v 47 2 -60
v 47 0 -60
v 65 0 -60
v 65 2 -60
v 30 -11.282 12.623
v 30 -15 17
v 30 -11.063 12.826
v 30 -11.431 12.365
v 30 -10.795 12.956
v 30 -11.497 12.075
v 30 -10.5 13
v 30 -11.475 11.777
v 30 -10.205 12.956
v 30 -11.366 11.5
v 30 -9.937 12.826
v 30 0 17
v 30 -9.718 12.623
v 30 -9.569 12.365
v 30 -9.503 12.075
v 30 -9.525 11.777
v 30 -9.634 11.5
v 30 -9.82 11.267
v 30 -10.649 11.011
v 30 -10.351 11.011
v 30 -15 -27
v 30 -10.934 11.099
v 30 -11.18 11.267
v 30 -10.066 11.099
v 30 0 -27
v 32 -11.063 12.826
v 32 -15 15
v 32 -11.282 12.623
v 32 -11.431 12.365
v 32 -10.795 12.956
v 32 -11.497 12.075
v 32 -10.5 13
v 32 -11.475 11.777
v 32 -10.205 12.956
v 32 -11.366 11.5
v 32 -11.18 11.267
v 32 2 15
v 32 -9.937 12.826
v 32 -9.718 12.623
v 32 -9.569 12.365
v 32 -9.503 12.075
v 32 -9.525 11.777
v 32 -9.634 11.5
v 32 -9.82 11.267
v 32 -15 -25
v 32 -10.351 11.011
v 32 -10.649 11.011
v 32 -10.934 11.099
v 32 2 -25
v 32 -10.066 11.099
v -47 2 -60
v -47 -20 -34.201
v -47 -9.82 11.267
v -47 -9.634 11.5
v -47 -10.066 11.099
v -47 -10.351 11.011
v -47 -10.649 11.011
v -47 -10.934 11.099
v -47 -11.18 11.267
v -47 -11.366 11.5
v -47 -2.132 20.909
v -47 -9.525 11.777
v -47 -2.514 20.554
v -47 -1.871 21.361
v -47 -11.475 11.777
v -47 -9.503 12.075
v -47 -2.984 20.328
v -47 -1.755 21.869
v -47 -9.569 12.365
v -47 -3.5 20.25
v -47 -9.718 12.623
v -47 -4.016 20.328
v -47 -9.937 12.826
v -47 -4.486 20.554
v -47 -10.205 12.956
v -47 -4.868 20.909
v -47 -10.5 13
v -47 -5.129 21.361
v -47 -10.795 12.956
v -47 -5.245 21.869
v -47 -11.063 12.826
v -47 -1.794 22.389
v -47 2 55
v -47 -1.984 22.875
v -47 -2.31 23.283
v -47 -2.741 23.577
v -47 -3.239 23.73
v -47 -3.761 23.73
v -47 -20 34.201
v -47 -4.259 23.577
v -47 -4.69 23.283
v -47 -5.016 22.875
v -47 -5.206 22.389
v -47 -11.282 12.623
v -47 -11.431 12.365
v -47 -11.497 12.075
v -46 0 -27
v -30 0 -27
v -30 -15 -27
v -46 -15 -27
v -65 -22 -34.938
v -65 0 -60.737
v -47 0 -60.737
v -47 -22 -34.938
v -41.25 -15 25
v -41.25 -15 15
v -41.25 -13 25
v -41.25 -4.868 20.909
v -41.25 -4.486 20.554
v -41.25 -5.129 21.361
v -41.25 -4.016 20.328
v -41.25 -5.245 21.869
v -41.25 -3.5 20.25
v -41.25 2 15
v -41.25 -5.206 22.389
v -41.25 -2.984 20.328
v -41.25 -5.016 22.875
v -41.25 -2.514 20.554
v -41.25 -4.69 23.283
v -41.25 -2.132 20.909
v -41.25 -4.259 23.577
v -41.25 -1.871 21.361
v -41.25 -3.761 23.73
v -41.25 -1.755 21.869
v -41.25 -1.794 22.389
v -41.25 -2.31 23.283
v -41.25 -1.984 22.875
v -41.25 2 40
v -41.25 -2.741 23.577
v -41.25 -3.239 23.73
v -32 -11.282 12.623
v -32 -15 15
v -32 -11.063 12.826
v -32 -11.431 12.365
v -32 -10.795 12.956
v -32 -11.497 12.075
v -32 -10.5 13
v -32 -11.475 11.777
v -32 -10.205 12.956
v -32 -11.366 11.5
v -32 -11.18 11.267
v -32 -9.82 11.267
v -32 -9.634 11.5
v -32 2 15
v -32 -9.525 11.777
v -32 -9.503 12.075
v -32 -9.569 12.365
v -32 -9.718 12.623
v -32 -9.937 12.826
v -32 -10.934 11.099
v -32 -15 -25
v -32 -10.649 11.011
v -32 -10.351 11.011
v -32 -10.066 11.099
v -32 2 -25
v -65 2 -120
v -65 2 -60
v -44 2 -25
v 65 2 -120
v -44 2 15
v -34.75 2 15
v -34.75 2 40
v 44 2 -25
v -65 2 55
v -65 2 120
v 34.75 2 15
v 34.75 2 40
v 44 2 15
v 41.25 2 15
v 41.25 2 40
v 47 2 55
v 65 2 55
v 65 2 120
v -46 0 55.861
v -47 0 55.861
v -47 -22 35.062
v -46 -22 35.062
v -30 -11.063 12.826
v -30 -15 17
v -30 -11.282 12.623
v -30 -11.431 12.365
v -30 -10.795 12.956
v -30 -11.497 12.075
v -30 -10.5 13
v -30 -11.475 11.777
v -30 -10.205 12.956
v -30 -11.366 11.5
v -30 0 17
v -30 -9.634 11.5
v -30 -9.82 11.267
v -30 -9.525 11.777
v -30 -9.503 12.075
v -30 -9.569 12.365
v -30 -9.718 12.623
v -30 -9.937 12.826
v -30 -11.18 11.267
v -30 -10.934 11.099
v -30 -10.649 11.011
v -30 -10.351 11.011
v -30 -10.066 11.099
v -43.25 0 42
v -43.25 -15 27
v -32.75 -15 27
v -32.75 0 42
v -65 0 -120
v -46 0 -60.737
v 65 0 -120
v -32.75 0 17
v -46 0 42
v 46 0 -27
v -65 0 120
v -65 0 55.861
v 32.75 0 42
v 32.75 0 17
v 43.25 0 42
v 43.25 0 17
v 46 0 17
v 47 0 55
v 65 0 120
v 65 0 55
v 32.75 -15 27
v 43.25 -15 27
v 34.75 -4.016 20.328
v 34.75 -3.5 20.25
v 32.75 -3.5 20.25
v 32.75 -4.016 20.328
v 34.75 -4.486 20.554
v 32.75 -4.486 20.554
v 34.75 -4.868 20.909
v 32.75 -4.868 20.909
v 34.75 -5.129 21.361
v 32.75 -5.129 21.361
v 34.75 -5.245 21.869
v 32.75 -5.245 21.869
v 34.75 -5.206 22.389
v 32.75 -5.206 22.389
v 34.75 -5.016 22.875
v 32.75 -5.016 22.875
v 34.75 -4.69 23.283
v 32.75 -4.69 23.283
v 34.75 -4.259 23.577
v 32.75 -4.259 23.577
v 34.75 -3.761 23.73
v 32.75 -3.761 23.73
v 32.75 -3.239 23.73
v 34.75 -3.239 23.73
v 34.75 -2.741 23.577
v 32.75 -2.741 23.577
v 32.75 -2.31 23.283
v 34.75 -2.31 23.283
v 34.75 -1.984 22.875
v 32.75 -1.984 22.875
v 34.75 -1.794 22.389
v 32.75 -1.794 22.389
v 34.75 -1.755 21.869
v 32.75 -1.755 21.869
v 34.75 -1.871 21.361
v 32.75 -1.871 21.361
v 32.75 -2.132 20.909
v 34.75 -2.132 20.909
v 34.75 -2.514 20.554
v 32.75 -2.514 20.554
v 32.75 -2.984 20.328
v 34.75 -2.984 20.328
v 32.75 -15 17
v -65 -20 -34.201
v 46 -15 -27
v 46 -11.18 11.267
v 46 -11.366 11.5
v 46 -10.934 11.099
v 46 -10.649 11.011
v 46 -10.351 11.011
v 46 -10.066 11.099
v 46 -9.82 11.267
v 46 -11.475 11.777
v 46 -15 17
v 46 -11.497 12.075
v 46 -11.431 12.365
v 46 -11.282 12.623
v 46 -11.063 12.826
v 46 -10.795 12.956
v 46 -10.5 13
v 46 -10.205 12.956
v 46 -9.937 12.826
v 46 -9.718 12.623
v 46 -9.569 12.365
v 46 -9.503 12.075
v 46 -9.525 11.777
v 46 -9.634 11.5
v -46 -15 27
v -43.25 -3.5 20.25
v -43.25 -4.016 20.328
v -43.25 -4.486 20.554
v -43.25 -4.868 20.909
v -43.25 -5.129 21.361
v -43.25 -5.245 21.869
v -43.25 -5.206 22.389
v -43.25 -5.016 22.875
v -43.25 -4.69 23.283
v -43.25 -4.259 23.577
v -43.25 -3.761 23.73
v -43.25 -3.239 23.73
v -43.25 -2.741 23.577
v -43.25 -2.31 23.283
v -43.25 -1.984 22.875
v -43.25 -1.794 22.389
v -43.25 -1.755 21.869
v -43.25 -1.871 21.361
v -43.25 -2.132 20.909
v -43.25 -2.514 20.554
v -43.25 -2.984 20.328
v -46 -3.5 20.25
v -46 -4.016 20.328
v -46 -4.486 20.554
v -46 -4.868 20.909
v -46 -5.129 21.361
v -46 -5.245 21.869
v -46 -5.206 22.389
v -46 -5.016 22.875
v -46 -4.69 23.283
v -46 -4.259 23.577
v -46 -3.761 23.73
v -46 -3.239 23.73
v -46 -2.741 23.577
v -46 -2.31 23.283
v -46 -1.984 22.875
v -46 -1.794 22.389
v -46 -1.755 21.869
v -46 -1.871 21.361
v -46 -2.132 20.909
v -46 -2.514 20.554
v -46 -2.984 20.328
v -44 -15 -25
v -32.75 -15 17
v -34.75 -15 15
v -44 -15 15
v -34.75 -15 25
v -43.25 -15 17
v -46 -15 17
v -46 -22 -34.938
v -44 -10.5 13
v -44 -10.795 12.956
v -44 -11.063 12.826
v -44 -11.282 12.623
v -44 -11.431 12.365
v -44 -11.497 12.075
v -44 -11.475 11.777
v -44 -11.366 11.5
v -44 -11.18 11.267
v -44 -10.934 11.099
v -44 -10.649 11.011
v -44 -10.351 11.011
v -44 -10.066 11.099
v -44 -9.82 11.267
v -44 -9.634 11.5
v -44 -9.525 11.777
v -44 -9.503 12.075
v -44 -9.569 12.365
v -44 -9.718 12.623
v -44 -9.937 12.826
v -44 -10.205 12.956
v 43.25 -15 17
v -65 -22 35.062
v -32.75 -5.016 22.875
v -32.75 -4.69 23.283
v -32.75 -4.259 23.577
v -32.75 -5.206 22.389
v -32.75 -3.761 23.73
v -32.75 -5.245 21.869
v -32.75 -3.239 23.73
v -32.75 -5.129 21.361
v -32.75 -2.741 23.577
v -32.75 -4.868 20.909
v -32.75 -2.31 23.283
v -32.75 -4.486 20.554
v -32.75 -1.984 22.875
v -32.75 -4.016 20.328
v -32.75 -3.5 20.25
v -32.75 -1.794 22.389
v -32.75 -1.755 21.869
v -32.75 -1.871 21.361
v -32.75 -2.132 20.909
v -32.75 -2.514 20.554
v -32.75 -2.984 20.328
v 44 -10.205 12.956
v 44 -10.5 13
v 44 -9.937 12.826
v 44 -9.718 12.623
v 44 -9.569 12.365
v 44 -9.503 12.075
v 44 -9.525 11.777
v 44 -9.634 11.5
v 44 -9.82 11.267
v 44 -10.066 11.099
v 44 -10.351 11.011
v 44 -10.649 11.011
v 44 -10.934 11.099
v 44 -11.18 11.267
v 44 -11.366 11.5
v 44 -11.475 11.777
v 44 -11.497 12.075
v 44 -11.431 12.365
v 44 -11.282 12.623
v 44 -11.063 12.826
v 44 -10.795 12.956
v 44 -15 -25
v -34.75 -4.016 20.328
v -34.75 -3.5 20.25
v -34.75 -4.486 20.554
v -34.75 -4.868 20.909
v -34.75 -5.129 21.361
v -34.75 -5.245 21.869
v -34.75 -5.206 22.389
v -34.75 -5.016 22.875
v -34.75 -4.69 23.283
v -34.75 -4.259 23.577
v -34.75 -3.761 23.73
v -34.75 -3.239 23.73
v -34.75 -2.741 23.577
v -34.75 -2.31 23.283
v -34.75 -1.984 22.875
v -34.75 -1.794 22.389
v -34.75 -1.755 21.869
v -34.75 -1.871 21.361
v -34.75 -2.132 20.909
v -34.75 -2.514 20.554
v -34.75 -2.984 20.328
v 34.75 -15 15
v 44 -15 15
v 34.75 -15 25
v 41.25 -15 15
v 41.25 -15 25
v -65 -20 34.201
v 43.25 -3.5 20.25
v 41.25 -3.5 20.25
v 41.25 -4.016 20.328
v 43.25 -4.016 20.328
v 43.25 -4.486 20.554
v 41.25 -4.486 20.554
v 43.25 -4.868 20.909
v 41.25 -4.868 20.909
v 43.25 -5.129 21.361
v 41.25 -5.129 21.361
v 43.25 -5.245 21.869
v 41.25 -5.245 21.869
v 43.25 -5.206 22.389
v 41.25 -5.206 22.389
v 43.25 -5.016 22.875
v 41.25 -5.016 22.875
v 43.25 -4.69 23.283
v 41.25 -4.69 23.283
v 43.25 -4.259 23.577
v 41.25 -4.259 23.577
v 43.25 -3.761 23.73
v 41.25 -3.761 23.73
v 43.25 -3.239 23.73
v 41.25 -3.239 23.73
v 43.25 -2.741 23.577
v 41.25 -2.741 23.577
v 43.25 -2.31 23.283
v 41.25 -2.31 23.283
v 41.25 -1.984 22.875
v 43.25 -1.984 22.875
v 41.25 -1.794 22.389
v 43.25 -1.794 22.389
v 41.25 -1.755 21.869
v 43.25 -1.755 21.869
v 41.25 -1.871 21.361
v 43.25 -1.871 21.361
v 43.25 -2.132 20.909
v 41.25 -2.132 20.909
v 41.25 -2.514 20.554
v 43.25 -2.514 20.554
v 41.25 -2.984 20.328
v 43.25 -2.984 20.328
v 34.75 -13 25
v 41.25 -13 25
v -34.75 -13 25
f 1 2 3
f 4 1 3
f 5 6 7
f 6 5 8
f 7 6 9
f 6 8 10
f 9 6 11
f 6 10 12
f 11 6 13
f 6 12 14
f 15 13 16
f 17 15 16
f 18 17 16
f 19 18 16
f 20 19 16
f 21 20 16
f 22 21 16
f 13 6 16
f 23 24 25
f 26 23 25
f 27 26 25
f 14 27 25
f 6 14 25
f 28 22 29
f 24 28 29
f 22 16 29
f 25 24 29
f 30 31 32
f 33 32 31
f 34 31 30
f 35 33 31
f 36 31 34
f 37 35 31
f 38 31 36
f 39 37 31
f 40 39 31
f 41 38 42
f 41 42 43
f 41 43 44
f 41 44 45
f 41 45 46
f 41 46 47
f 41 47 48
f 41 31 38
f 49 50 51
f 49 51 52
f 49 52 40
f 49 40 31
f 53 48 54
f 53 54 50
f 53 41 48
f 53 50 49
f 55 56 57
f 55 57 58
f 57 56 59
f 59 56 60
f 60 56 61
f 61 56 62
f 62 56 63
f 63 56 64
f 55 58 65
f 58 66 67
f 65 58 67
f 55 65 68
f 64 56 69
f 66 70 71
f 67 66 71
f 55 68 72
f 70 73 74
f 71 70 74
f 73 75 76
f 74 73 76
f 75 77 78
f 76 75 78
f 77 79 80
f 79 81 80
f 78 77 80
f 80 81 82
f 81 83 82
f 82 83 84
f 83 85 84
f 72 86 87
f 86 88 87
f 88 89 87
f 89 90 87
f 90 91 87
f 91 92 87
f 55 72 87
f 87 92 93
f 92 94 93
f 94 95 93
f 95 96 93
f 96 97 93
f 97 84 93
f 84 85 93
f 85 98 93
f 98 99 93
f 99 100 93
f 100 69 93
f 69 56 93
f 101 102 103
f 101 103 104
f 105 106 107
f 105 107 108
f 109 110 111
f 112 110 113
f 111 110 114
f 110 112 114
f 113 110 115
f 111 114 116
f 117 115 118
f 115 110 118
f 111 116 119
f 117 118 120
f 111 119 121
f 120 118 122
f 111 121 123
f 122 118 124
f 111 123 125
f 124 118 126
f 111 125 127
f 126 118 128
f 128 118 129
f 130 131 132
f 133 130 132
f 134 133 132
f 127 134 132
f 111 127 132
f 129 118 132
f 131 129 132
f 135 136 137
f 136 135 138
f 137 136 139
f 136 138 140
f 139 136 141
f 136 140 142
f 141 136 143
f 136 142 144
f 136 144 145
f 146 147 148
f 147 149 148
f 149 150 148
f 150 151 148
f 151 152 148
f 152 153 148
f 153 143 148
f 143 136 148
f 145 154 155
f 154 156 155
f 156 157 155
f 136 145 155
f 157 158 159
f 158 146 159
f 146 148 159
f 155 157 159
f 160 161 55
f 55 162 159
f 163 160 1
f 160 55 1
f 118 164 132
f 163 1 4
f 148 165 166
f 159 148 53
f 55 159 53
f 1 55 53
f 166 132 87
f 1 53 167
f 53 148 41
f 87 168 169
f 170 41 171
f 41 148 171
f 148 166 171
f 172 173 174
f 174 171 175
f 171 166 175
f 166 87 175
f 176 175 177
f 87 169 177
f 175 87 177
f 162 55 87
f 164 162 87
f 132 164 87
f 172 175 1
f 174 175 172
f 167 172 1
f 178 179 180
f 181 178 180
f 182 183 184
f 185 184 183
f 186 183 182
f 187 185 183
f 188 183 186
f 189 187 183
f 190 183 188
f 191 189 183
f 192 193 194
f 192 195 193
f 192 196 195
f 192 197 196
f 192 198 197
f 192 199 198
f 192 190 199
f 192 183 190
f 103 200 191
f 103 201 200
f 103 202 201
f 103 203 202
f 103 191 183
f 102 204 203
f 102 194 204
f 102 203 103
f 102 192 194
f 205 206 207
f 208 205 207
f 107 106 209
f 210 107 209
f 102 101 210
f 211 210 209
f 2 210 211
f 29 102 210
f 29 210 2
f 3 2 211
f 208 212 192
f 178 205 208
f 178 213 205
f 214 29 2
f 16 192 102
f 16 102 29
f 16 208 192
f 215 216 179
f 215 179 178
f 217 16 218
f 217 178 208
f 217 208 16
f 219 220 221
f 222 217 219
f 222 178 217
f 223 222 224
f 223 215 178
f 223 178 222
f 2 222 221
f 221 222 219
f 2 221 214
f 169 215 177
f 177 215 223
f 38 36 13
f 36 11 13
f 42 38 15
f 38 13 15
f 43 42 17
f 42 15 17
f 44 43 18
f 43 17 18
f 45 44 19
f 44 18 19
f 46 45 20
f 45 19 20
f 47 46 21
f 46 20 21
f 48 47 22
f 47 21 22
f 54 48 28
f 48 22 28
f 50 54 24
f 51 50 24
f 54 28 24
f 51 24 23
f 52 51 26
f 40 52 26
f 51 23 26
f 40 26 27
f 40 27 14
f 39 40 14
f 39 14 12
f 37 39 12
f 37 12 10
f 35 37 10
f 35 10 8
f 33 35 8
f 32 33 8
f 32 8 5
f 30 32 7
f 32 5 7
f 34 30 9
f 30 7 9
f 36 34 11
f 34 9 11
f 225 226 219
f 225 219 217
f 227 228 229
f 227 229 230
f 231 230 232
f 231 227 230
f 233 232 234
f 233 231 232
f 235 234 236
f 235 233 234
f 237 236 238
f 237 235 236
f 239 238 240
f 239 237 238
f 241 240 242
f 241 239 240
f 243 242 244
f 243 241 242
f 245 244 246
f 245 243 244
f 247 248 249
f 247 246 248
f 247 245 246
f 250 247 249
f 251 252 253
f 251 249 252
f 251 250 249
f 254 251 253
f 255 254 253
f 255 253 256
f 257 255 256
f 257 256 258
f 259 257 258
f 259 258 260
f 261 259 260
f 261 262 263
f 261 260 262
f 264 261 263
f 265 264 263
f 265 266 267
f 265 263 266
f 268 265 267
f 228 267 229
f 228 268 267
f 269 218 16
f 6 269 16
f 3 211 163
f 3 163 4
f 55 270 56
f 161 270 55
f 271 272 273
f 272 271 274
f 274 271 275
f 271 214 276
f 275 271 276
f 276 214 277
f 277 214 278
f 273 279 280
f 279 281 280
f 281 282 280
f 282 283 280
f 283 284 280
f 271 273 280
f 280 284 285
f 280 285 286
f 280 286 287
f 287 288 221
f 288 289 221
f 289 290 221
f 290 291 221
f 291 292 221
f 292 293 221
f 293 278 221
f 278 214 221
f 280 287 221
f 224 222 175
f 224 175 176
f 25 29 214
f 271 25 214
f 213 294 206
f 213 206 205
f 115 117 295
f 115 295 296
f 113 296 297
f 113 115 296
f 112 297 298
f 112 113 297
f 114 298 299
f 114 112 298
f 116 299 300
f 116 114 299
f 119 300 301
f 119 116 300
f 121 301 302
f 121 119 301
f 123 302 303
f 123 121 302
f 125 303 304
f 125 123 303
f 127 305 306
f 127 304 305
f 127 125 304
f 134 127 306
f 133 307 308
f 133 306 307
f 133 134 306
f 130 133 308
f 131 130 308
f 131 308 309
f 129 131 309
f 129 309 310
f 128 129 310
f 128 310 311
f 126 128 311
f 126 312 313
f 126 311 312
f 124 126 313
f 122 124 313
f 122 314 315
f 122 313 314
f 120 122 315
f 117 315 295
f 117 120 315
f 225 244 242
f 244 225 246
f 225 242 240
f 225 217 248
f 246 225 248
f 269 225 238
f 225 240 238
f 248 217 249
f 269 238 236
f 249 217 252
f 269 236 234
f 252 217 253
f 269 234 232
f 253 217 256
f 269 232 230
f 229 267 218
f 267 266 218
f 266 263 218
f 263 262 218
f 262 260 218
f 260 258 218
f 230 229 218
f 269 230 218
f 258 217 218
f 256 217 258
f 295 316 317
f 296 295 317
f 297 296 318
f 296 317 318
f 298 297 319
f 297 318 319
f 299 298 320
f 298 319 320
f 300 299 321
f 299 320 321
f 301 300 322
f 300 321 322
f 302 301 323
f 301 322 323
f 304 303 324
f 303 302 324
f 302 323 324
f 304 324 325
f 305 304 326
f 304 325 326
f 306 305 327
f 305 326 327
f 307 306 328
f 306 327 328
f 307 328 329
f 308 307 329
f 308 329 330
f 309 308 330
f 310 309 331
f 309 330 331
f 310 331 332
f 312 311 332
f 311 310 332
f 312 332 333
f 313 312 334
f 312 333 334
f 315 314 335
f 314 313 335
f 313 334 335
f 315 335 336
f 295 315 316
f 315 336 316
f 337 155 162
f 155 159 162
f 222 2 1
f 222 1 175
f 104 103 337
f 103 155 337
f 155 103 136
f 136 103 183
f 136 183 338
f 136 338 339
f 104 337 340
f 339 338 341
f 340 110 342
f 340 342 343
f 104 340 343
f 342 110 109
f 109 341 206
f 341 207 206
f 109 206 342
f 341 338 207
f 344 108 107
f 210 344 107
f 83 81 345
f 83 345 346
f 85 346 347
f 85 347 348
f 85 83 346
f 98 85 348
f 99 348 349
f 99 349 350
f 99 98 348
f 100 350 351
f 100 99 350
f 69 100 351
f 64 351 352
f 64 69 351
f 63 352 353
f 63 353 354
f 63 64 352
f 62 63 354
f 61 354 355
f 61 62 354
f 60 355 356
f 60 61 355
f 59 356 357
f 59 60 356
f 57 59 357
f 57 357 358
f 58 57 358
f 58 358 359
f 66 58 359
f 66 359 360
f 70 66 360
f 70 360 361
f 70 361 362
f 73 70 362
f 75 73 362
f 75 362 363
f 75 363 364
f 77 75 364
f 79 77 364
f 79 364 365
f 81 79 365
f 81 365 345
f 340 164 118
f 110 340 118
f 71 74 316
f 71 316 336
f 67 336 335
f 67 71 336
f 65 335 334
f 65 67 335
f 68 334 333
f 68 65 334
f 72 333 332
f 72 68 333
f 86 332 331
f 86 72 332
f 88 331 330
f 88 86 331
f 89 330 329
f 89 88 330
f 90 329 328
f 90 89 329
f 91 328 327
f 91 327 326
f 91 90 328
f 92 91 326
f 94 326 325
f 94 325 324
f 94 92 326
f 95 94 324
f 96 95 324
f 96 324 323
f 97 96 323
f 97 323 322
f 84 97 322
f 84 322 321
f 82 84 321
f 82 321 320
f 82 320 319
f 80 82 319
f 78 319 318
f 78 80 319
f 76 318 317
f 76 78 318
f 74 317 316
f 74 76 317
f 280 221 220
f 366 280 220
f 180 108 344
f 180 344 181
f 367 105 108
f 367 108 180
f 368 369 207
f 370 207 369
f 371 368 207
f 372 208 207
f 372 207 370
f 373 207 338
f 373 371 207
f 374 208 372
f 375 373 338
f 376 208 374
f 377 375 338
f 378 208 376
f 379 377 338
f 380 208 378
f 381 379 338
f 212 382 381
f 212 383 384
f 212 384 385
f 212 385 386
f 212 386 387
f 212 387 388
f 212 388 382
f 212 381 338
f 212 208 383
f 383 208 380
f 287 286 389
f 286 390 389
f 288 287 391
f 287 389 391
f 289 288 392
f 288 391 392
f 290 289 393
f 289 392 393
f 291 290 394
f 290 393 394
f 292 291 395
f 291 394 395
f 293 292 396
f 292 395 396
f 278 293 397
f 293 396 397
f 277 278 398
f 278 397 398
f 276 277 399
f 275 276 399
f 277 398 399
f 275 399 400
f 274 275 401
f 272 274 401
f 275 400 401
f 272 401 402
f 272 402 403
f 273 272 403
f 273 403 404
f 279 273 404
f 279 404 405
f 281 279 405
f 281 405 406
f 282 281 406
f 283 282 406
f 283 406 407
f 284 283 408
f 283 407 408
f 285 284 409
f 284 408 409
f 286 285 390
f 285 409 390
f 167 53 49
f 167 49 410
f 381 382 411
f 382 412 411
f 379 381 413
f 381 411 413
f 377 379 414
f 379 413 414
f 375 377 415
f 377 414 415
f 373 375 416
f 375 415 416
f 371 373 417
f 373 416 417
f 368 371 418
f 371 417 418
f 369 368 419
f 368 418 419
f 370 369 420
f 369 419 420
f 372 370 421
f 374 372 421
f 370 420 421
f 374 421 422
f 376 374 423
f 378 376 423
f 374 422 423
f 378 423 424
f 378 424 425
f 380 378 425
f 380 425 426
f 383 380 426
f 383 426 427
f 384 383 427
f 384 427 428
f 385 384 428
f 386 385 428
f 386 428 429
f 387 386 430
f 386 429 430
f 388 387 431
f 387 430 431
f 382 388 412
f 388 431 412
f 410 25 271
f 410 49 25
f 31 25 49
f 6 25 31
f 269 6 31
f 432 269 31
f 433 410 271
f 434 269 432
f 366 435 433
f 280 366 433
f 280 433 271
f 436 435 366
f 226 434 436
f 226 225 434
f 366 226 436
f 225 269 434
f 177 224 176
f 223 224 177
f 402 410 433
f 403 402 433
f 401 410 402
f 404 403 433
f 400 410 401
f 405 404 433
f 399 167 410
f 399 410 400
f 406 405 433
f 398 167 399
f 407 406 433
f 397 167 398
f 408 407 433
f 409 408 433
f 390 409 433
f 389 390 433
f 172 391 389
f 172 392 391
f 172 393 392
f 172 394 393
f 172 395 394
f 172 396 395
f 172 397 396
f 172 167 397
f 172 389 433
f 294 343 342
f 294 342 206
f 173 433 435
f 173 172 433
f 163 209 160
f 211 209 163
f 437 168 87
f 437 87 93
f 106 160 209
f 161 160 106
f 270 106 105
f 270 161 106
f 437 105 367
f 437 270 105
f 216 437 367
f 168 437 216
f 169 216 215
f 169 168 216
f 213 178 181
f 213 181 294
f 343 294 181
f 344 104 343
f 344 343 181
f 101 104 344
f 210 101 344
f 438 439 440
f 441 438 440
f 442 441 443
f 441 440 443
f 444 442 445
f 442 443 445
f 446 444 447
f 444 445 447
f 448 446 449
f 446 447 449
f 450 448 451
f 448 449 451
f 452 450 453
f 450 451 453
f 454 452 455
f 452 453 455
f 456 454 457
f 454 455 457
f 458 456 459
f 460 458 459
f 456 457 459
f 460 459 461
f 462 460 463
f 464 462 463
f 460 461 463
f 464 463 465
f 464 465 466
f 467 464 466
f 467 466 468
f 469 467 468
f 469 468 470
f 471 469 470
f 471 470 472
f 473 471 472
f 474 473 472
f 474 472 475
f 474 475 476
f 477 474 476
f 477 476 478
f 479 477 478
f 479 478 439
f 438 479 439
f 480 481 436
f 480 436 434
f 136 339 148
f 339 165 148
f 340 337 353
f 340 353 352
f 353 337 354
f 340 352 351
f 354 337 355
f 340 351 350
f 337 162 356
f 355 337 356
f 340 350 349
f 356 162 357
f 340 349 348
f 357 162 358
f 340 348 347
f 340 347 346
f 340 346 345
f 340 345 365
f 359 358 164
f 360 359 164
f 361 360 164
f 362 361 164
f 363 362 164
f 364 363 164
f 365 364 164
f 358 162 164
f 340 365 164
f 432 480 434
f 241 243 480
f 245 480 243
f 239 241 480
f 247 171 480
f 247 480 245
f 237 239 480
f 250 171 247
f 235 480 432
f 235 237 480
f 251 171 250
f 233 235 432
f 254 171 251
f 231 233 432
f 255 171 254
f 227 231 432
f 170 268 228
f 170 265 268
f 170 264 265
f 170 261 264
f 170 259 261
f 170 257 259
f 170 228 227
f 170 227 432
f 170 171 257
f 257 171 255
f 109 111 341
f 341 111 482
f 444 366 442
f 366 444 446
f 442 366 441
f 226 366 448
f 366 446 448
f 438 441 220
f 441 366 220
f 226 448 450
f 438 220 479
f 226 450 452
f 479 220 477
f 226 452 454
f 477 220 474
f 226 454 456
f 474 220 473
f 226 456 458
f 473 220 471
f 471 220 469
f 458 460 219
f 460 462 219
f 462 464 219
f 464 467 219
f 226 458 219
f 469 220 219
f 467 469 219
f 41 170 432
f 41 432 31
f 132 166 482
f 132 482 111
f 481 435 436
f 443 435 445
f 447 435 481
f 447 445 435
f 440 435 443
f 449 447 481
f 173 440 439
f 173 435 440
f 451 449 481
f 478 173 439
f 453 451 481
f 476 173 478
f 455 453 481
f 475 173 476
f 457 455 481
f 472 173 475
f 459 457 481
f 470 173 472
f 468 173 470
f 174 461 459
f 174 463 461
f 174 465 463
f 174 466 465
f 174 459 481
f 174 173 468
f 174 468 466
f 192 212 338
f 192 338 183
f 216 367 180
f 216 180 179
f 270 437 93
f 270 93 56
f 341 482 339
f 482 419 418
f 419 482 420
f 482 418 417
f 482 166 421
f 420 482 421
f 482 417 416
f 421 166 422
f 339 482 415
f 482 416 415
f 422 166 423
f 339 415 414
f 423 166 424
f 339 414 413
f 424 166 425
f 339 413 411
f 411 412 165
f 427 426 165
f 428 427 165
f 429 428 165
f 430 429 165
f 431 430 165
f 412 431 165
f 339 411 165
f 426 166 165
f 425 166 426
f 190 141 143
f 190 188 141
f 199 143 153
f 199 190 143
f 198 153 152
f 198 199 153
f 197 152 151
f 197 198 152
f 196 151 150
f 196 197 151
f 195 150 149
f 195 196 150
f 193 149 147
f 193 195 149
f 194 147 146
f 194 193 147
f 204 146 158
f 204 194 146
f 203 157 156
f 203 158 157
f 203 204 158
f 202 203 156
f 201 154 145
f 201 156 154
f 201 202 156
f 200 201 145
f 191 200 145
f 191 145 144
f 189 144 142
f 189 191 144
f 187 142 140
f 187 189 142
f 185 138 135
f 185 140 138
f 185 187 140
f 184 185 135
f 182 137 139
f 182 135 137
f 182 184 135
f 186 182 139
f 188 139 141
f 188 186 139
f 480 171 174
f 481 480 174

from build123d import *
from build123d.topology import SkipClean

# Parameters (mm, degrees)
SKETCH1_W                = 100
SKETCH1_H                = 100
BOSS_EXTRUDE1_DEPTH      = 2
CUT_EXTRUDE1_REACH       = 72.739
SKETCH2_W                = 12
SKETCH2_H                = 50
SKETCH3_W                = 2.75
SKETCH3_H                = 10
BOSS_EXTRUDE2_DEPTH      = 2
BOSS_EXTRUDE3_DEPTH      = 15
SKETCH5_R                = 1.75
SKETCH5_R_2              = 1
CUT_EXTRUDE2_DEPTH       = 103.318131336
CHAMFER1_SIZE            = 15
CHAMFER1_OF_MIRROR1_SIZE = 15
SKETCH6_W                = 130
SKETCH6_H                = 240
SKETCH6_W_2              = 100
SKETCH6_H_2              = 100
BOSS_EXTRUDE4_DEPTH      = 2
CUT_EXTRUDE3_REACH       = 139.295
SKETCH7_W                = 18
SKETCH7_H                = 115
BOSS_EXTRUDE5_DEPTH      = 18
SKETCH9_R                = 1.75
SKETCH9_R_2              = 1
BOSS_EXTRUDE10_DEPTH     = 1
BOSS_EXTRUDE11_START     = 2.75
SKETCH10_R               = 1.75
BOSS_EXTRUDE11_DEPTH     = 2.75


with BuildPart() as part:
    # Sketch1 → Boss-Extrude1 (new body)
    with BuildSketch(Plane(origin=(0, 0, 0), x_dir=(1, 0, 0), z_dir=(0, 1, 0))):
        Rectangle(SKETCH1_W, SKETCH1_H)
    extrude(amount=BOSS_EXTRUDE1_DEPTH)

    # Sketch2 → Cut-Extrude1 (cut, up to next)
    with BuildSketch(Plane(origin=(0, 2, 0), x_dir=(1, 0, 0), z_dir=(0, 1, 0)), mode=Mode.PRIVATE) as cut_extrude1_sk1:
        with Locations((38, 0)):
            Rectangle(SKETCH2_W, SKETCH2_H)
    cut_extrude1_tool1 = extrude(cut_extrude1_sk1.sketch, amount=-CUT_EXTRUDE1_REACH, mode=Mode.PRIVATE) & part.part
    cut_extrude1 = cut_extrude1_tool1.solids().sort_by_distance((38, 2, 0))[0]
    add(cut_extrude1, mode=Mode.SUBTRACT)

    # Sketch3 → Boss-Extrude2 (add)
    with BuildSketch(Plane.XZ):
        with Locations((33.375, 20)):
            Rectangle(SKETCH3_W, SKETCH3_H)
        with Locations((42.625, 20)):
            Rectangle(SKETCH3_W, SKETCH3_H)
    boss_extrude2 = extrude(amount=-BOSS_EXTRUDE2_DEPTH)

    # Sketch4 → Boss-Extrude3 (add)
    with BuildSketch(Plane.XZ):
        Polygon((46, 17), (43.25, 17), (43.25, 27), (32.75, 27), (32.75, 17), (30, 17), (30, -27), (46, -27), align=None)
        Polygon((44, 15), (41.25, 15), (41.25, 25), (34.75, 25), (34.75, 15), (32, 15), (32, -25), (44, -25), align=None, mode=Mode.SUBTRACT)
    boss_extrude3 = extrude(amount=BOSS_EXTRUDE3_DEPTH)

    # Sketch5 → Cut-Extrude2 (cut, symmetric)
    with BuildSketch(Plane.ZY.offset(-38)):
        with Locations(Location((22, -3.5, 0), (0, 0, 180))):
            Circle(SKETCH5_R)
        with Locations((12, -10.5)):
            Circle(SKETCH5_R_2)
    cut_extrude2 = extrude(amount=CUT_EXTRUDE2_DEPTH, both=True, mode=Mode.SUBTRACT)

    # Chamfer1
    chamfer1_edges = [part.edges().sort_by_distance(p)[0] for p in [
        (38, 2, 25),
        (38, 0, 27),
    ]]
    chamfer(chamfer1_edges, length=CHAMFER1_SIZE - 0.0001)  # a hair under: the kernel refuses the full size

    # Mirror1: Cut-Extrude1, Boss-Extrude2, Boss-Extrude3, Cut-Extrude2 across plane
    add(cut_extrude1.mirror(Plane(origin=(0, 0, 0), x_dir=(0, 0, 1), z_dir=(1, 0, 0))), mode=Mode.SUBTRACT)
    add(boss_extrude2.mirror(Plane(origin=(0, 0, 0), x_dir=(0, 0, 1), z_dir=(1, 0, 0))))
    add(boss_extrude3.mirror(Plane(origin=(0, 0, 0), x_dir=(0, 0, 1), z_dir=(1, 0, 0))))
    add(cut_extrude2.mirror(Plane(origin=(0, 0, 0), x_dir=(0, 0, 1), z_dir=(1, 0, 0))), mode=Mode.SUBTRACT)

    # Chamfer1 of Mirror1
    chamfer1_of_mirror1_edges = [part.edges().sort_by_distance(p)[0] for p in [
        (-38, 2, 25),
        (-38, 0, 27),
    ]]
    chamfer(chamfer1_of_mirror1_edges, length=CHAMFER1_OF_MIRROR1_SIZE - 0.0001)  # a hair under: the kernel refuses the full size

    # Sketch6 → Boss-Extrude4 (add)
    with BuildSketch(Plane.XZ):
        Rectangle(SKETCH6_W, SKETCH6_H)
        Rectangle(SKETCH6_W_2, SKETCH6_H_2, mode=Mode.SUBTRACT)
    extrude(amount=-BOSS_EXTRUDE4_DEPTH)

    # Sketch7 → Cut-Extrude3 (cut, up to next)
    with BuildSketch(Plane.XZ, mode=Mode.PRIVATE) as cut_extrude3_sk1:
        with Locations((-56, -2.5)):
            Rectangle(SKETCH7_W, SKETCH7_H)
    cut_extrude3_tool1 = extrude(cut_extrude3_sk1.sketch, amount=-CUT_EXTRUDE3_REACH, mode=Mode.PRIVATE) & part.part
    # Sketch7 → Cut-Extrude3 (cut, up to next)
    with BuildSketch(Plane.XZ, mode=Mode.PRIVATE) as cut_extrude3_sk2:
        with Locations((56, -2.5)):
            Rectangle(SKETCH7_W, SKETCH7_H)
    cut_extrude3_tool2 = extrude(cut_extrude3_sk2.sketch, amount=-CUT_EXTRUDE3_REACH, mode=Mode.PRIVATE) & part.part
    add(cut_extrude3_tool1.solids().sort_by_distance((-56, 0, -2.5))[0], mode=Mode.SUBTRACT)
    add(cut_extrude3_tool2.solids().sort_by_distance((56, 0, -2.5))[0], mode=Mode.SUBTRACT)

    # Sketch8 → Boss-Extrude5 (add)
    with BuildSketch(Plane.ZY.offset(65)):
        Polygon((55, 2), (34.200780206, -20), (-34.200780206, -20), (-60, 2), (-61.297715069, 0.478180168), (-34.937737308, -22), (35.062262692, -22), (56.453319038, 0.62600445), align=None)
    extrude(amount=-BOSS_EXTRUDE5_DEPTH)

    # Sketch9 → Boss-Extrude10 (add)
    with BuildSketch(Plane(origin=(-47, 0, 0), x_dir=(0, 0, -1), z_dir=(1, 0, 0))):
        Polygon((63.08234072, 2), (-57.75232065, 2), (-35.062262692, -22), (34.937737308, -22), align=None)
        with Locations((-22, -3.5)):
            Circle(SKETCH9_R, mode=Mode.SUBTRACT)
        with Locations(Location((-12, -10.5, 0), (0, 0, 180))):
            Circle(SKETCH9_R_2, mode=Mode.SUBTRACT)
    extrude(amount=BOSS_EXTRUDE10_DEPTH)

    # Sketch10 → Boss-Extrude11 (add)
    with SkipClean():  # the faces are left unmerged after this step: merging them gives an invalid solid
        with BuildSketch(Plane.ZY.offset(43.25).offset(BOSS_EXTRUDE11_START)):
            Polygon((42, 0), (17, 0), (17, -15), (27, -15), align=None)
            with Locations(Location((22, -3.5, 0), (0, 0, 180))):
                Circle(SKETCH10_R, mode=Mode.SUBTRACT)
        extrude(amount=-BOSS_EXTRUDE11_DEPTH)


solid = part.part
